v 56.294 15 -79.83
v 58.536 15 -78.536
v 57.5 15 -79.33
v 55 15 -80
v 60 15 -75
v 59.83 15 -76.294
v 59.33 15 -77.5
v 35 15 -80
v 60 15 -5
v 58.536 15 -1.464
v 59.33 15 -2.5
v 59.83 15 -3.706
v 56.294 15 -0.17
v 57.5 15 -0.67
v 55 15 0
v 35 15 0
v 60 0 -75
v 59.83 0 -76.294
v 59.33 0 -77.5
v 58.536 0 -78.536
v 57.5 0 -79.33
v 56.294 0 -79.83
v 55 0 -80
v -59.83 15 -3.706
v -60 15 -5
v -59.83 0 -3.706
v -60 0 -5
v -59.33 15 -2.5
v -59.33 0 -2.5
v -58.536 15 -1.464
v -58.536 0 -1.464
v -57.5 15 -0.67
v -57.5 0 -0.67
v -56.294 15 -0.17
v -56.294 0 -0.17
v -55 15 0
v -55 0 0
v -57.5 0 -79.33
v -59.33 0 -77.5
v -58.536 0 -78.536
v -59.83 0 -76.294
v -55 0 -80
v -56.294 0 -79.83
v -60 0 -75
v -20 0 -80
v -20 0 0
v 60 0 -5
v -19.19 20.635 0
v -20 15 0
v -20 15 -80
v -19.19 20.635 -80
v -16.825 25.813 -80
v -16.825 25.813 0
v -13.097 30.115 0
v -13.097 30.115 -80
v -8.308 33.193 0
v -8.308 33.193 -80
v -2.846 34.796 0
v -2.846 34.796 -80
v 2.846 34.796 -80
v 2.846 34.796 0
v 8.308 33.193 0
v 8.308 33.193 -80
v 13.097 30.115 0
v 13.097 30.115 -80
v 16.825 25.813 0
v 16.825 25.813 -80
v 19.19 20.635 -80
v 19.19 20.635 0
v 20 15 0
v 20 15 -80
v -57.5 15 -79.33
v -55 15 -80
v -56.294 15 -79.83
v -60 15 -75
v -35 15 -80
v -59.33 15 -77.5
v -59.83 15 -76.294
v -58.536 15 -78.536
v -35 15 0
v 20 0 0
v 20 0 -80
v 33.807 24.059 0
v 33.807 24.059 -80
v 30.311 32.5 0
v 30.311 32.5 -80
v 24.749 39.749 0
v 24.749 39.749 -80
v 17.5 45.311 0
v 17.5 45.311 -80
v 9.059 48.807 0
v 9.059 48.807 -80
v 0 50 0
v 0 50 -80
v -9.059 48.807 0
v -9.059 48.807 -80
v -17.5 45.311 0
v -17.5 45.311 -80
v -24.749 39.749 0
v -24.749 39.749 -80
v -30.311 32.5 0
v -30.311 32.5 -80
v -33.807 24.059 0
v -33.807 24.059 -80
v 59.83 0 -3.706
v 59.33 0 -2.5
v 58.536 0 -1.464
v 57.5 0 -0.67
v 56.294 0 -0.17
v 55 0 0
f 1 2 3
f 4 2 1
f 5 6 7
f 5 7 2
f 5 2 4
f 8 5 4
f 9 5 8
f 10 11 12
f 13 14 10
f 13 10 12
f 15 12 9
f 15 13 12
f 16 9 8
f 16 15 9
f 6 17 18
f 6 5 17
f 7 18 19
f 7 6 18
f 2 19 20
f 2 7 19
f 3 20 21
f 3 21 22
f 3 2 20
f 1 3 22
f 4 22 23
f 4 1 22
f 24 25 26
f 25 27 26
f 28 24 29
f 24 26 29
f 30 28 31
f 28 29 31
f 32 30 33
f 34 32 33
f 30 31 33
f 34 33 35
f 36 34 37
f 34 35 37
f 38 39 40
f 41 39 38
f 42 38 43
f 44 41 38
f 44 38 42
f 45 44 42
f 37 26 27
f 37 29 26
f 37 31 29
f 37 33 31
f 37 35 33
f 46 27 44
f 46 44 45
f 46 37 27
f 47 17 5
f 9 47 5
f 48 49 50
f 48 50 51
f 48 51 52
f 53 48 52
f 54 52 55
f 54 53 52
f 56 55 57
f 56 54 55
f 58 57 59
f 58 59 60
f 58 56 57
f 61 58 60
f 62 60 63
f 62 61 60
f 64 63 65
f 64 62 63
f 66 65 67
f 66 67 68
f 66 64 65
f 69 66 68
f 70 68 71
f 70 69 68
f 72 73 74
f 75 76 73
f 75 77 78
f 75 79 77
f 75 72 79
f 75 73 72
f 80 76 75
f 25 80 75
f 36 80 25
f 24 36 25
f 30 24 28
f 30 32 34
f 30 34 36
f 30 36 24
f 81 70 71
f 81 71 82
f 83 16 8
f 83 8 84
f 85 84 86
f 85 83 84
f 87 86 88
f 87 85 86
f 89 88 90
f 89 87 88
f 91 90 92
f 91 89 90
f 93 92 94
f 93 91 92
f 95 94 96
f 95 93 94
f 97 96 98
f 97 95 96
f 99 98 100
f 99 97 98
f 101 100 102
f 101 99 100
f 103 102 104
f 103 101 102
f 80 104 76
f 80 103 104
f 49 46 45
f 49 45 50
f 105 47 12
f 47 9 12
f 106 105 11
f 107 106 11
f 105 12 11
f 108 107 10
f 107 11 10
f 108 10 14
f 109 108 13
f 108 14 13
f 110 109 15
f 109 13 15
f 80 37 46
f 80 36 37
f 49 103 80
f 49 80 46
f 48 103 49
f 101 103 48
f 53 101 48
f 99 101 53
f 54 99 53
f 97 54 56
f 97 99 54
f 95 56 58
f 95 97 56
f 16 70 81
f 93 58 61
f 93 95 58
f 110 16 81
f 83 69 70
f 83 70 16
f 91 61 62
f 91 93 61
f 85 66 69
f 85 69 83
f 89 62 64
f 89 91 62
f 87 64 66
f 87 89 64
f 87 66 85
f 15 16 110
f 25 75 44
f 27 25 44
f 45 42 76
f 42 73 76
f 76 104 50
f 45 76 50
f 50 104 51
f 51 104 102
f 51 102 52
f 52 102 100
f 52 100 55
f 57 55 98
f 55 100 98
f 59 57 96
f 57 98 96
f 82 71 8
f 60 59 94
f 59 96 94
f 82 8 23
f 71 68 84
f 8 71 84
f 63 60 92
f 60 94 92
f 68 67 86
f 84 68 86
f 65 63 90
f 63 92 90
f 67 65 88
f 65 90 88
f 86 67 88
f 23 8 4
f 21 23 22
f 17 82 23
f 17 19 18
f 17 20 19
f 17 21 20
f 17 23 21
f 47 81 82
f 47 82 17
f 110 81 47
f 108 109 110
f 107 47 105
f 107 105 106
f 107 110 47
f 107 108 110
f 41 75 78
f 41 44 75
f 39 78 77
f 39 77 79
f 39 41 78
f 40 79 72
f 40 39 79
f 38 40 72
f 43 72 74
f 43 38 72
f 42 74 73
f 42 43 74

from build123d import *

# Parameters (mm, degrees)
EXTRUDE_1_DEPTH = 80
FILLET_1_R      = 5


with BuildPart() as part:
    # Эскиз1 → Бобышка-Вытянуть1 (new body)
    with BuildSketch(Plane.XY):
        with BuildLine():
            Line((-60, 0), (-20, 0))
            Line((-20, 0), (-20, 15))
            ThreePointArc((-20, 15), (0, 35), (20, 15))
            Line((20, 15), (20, 0))
            Line((20, 0), (60, 0))
            Line((60, 0), (60, 15))
            Line((60, 15), (35, 15))
            ThreePointArc((35, 15), (0, 50), (-35, 15))
            Line((-35, 15), (-60, 15))
            Line((-60, 15), (-60, 0))
        make_face()
    extrude(amount=-EXTRUDE_1_DEPTH)

    # Скругление1
    fillet_1_edges = [part.edges().sort_by_distance(p)[0] for p in [
        (60, 7.5, 0),
        (-60, 7.5, 0),
        (60, 7.5, -80),
        (-60, 7.5, -80),
    ]]
    fillet(fillet_1_edges, radius=FILLET_1_R)


solid = part.part
